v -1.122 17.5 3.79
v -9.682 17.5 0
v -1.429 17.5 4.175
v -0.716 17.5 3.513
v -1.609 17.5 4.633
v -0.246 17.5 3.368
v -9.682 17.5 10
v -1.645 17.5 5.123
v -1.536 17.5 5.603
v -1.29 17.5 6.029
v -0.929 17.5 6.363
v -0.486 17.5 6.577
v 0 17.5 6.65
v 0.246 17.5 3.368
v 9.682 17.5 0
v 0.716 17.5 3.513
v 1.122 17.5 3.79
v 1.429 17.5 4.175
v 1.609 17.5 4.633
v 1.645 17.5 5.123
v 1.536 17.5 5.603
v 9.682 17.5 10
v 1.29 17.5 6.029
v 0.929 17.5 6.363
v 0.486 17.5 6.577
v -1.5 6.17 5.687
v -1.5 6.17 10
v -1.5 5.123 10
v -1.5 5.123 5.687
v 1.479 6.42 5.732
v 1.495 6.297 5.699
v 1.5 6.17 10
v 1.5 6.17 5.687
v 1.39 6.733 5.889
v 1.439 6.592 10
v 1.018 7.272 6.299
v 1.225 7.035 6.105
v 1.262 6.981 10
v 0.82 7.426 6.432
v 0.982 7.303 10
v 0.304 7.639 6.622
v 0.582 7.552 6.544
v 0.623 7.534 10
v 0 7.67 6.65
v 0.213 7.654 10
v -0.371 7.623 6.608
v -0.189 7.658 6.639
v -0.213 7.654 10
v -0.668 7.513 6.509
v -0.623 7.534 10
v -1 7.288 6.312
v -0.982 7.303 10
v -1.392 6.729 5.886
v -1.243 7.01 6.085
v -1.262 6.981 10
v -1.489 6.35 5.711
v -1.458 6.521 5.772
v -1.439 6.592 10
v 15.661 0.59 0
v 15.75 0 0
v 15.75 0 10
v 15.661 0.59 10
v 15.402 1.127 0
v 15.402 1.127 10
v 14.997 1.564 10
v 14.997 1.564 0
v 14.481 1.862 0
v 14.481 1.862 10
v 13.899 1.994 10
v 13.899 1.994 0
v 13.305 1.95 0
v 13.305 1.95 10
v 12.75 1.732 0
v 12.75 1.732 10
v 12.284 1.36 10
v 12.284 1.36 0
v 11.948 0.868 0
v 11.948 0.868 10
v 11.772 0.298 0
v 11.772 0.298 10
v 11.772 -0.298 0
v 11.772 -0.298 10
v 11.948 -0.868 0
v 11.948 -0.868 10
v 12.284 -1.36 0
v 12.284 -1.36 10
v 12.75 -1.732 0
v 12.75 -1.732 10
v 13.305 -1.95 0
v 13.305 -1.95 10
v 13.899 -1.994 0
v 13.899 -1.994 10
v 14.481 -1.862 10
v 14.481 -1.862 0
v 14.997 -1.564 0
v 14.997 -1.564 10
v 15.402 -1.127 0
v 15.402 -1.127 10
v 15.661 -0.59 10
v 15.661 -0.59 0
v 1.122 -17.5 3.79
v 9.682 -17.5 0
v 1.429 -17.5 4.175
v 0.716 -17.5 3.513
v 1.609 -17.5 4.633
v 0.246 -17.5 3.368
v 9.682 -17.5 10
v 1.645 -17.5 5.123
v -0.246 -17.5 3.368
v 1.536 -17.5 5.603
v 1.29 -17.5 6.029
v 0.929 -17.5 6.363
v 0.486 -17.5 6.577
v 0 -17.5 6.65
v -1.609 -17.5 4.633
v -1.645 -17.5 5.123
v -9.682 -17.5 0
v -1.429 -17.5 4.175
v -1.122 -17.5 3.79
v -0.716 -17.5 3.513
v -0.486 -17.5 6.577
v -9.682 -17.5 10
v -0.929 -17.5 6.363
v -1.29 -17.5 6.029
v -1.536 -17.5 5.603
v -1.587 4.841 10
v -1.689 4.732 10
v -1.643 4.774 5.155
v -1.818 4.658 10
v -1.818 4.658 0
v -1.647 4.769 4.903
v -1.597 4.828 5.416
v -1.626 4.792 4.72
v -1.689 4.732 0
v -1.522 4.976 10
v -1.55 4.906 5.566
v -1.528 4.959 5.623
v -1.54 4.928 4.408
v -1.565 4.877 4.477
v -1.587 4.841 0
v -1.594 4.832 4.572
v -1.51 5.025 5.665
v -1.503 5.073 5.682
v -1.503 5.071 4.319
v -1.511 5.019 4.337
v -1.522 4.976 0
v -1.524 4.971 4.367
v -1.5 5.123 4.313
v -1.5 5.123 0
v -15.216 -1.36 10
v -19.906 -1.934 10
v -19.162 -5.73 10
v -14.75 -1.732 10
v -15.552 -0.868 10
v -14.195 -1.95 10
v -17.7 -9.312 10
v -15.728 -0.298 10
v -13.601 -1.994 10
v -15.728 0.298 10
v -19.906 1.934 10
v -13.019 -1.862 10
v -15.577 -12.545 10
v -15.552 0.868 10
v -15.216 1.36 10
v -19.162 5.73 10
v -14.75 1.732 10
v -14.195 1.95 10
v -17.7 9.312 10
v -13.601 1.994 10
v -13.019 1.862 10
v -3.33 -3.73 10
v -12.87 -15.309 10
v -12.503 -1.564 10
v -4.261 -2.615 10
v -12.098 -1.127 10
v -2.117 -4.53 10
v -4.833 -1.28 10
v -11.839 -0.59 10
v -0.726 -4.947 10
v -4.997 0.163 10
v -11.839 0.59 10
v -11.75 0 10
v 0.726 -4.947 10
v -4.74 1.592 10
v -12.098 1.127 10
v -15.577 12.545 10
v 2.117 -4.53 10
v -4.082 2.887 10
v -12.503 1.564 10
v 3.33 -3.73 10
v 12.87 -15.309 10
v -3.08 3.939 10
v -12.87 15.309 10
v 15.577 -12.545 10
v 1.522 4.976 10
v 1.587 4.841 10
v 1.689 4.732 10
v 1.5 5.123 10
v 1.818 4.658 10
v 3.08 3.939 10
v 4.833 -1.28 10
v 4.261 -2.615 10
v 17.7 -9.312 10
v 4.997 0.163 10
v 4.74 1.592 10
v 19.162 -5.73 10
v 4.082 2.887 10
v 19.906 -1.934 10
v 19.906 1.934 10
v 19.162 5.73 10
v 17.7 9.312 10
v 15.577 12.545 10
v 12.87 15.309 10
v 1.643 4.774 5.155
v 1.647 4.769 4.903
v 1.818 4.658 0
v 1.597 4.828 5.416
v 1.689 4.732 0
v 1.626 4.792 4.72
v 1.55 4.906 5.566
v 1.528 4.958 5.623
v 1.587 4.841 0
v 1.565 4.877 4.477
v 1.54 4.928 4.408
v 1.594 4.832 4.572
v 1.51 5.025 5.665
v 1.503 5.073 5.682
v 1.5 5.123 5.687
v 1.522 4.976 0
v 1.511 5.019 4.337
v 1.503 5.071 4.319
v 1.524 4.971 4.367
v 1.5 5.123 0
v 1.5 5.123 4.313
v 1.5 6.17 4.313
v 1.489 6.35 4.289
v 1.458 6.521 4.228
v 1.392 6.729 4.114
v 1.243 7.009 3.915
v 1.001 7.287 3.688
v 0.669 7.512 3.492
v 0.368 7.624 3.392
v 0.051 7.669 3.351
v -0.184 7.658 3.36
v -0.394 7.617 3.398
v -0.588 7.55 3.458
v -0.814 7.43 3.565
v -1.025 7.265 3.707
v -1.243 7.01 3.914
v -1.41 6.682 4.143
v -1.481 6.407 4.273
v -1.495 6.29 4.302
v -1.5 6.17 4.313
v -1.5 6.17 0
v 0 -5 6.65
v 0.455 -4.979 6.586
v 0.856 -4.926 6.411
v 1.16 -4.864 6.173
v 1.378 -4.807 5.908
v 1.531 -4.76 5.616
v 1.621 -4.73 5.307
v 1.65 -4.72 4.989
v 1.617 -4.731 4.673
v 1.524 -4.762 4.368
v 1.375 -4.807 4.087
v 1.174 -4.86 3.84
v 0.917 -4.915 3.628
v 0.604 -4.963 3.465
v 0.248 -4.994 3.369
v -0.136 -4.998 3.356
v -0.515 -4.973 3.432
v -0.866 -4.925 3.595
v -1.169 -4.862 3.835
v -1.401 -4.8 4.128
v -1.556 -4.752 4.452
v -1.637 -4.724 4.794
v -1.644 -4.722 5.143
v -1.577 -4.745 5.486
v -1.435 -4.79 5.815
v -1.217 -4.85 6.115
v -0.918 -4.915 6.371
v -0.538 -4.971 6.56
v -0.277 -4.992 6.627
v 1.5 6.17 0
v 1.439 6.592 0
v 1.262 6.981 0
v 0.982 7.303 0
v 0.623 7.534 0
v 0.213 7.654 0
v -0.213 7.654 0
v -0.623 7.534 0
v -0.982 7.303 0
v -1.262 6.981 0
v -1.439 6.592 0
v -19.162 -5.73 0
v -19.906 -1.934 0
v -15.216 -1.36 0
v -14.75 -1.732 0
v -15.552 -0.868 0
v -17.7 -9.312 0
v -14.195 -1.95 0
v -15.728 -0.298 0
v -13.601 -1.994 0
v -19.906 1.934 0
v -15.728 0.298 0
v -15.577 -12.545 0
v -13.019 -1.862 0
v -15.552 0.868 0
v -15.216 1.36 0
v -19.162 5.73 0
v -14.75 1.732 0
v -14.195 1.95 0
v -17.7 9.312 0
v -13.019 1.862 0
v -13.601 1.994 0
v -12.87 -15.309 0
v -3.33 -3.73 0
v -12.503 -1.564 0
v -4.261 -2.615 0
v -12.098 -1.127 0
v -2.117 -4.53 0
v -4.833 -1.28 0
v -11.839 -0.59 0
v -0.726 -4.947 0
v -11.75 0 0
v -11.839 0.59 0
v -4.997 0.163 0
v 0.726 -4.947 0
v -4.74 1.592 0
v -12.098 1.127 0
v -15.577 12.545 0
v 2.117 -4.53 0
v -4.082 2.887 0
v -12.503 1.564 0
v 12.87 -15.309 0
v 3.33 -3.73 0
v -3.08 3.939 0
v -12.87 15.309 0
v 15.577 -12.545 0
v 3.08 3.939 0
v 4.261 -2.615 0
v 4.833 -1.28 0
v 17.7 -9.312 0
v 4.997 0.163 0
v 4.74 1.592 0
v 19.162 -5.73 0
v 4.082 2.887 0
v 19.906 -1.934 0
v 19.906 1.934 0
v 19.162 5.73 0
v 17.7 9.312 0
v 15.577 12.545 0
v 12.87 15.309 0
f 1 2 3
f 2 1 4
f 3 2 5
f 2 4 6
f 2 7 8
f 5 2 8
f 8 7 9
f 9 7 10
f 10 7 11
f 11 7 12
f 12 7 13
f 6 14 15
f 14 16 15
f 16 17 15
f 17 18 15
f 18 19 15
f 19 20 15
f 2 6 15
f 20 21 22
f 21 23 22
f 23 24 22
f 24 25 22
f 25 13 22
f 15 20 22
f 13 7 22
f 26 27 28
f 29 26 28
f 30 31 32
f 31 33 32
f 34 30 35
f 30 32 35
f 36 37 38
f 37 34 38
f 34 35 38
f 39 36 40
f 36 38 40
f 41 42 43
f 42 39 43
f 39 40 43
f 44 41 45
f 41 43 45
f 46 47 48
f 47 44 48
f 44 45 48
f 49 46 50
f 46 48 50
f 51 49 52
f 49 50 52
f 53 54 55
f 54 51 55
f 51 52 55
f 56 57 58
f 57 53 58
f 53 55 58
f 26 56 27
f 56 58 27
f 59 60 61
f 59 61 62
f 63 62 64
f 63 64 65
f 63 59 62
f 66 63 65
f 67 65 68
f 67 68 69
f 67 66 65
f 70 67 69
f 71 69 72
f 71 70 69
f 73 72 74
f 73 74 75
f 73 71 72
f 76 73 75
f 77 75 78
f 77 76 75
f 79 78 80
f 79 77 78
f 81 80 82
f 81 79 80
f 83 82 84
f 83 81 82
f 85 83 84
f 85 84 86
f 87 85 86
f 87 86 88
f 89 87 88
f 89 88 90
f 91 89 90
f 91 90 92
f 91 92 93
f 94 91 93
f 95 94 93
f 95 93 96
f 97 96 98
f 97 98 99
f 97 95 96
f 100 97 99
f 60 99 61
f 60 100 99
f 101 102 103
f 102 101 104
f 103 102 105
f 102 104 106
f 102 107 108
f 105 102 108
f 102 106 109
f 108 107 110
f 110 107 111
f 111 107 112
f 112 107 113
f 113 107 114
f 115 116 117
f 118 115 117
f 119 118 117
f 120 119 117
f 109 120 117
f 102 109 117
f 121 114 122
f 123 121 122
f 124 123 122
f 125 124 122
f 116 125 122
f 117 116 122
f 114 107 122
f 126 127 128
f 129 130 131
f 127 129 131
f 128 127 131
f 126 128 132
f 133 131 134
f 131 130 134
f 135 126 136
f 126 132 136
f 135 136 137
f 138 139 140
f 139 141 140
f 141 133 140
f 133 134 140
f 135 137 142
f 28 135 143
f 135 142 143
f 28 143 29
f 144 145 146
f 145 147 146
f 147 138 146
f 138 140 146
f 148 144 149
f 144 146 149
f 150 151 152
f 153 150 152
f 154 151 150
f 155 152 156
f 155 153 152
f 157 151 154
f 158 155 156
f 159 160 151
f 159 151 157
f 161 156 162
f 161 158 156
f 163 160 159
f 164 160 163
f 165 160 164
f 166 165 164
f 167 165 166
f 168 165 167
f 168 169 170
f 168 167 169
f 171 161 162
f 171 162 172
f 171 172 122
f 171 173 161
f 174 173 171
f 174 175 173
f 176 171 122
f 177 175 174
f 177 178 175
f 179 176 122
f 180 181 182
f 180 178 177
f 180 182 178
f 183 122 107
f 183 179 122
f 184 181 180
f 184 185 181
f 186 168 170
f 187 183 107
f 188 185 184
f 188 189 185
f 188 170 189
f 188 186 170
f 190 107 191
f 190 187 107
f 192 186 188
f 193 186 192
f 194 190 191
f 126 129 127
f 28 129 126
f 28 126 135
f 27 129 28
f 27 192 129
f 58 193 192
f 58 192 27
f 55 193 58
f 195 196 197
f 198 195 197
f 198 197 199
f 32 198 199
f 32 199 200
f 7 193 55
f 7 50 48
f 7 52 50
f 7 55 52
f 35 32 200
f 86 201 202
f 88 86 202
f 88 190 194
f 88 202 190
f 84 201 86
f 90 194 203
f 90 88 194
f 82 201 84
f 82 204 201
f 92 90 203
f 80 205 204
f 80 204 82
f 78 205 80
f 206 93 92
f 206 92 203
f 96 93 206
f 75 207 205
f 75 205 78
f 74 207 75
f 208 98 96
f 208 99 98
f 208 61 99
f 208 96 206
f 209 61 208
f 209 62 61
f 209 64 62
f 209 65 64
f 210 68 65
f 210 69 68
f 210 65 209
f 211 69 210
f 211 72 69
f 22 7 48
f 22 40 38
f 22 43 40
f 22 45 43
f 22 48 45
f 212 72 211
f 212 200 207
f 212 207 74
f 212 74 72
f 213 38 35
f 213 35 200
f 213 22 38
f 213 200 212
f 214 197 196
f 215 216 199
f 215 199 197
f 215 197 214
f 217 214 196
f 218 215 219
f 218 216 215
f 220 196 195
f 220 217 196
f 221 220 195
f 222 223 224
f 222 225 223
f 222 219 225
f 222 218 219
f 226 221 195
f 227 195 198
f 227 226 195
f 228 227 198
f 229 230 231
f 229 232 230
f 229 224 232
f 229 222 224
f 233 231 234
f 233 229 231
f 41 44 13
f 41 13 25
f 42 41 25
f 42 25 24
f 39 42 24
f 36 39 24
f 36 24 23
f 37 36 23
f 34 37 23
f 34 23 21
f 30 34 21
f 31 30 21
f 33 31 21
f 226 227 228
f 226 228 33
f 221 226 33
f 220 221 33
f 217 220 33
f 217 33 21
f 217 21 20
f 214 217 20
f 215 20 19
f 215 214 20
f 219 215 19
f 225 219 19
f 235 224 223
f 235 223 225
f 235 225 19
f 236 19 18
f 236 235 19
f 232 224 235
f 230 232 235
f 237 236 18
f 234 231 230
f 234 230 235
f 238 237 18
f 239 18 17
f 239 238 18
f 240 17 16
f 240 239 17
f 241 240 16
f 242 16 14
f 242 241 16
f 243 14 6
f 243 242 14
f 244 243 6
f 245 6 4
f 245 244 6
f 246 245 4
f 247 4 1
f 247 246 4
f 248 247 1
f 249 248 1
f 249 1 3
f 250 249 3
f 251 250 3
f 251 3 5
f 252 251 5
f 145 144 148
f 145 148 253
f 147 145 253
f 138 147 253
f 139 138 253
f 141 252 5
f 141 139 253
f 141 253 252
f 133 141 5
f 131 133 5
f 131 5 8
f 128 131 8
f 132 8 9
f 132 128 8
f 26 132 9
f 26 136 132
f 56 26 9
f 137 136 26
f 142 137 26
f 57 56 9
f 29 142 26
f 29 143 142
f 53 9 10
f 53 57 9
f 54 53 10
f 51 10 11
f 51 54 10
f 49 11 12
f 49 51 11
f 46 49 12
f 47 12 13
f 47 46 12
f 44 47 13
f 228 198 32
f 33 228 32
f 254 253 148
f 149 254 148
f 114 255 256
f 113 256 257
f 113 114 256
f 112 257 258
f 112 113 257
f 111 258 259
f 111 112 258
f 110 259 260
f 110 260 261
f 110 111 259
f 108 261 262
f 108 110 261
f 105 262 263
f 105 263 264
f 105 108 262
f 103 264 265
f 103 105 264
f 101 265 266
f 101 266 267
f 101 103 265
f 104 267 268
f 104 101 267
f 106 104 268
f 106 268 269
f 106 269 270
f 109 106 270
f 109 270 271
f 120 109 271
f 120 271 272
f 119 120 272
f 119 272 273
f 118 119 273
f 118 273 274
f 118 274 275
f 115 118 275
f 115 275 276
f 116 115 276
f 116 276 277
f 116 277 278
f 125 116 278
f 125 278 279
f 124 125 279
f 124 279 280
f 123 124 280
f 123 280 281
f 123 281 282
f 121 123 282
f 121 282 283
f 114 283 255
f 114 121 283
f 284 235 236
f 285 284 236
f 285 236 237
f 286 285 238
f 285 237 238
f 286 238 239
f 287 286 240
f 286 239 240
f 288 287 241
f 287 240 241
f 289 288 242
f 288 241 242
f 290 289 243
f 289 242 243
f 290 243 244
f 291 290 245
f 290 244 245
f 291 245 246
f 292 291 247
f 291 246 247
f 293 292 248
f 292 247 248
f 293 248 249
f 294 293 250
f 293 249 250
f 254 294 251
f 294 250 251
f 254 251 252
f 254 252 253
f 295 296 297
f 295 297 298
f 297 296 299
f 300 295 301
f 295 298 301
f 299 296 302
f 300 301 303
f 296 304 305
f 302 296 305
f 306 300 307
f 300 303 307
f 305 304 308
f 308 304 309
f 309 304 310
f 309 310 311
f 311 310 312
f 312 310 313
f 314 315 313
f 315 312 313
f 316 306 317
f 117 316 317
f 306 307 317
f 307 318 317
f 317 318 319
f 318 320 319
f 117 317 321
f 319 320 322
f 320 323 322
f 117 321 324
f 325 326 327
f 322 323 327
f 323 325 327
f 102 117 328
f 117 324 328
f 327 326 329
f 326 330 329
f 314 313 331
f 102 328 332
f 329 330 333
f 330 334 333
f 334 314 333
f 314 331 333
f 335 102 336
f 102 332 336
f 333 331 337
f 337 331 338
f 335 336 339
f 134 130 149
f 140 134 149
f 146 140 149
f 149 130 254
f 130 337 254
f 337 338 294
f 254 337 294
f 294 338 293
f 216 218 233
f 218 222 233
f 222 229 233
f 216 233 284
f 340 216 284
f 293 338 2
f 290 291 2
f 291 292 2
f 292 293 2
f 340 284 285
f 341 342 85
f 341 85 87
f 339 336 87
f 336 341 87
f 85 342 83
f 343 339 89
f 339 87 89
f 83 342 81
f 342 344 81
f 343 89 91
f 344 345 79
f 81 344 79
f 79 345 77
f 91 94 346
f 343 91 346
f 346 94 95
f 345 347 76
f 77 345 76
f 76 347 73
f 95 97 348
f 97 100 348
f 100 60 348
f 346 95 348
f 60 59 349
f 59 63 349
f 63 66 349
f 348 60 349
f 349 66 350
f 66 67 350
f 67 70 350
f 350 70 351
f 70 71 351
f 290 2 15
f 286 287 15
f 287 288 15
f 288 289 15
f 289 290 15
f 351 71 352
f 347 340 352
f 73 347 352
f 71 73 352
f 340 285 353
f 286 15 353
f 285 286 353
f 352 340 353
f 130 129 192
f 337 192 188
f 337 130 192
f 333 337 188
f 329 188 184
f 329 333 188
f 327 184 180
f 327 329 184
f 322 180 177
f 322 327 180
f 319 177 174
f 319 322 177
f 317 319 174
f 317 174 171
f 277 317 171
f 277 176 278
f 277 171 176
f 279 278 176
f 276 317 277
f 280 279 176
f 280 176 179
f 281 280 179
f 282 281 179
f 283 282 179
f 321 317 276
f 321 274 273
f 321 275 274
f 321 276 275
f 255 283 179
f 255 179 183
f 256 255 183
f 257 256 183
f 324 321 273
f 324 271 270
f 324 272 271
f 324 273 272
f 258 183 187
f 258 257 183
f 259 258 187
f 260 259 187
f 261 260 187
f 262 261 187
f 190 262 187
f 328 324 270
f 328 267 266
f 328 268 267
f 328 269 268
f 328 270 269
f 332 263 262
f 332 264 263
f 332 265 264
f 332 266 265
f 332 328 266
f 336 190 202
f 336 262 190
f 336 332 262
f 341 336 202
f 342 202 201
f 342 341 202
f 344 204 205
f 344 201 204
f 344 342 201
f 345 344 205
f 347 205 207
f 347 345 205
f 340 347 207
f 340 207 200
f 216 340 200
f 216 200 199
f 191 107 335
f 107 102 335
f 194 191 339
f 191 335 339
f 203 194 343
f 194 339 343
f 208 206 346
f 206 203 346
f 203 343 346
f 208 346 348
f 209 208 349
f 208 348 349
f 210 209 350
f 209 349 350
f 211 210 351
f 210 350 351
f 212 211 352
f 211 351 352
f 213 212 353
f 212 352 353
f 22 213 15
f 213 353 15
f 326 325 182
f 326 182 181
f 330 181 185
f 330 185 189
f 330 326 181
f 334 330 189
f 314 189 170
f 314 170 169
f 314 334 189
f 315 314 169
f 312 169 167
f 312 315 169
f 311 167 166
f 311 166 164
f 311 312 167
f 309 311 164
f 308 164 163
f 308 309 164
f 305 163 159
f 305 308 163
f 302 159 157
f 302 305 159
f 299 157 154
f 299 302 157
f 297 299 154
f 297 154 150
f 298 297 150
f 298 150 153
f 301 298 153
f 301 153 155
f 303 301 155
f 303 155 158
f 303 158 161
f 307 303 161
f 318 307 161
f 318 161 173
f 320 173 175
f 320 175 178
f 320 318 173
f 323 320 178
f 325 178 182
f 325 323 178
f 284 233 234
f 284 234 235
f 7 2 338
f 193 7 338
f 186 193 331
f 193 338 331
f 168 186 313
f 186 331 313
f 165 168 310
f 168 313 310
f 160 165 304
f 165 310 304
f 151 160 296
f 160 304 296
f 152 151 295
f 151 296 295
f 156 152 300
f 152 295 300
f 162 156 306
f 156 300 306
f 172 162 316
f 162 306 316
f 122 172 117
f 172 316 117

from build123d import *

# Parameters (mm, degrees)
SKETCH_1_R               = 20
SKETCH_1_R_2             = 5
SKETCH_1_R_3             = 1.9999999999999996
SKETCH_1_R_4             = 2.0000000000000013
EXTRUDE_1_DEPTH          = 10
CUT_EXTRUDE_1_DEPTH      = 31
CUT_EXTRUDE_1_DEPTH_BACK = 31
SKETCH_2_R               = 1.6500000000000001
CUT_EXTRUDE_2_DEPTH      = 31.00000018509541
CUT_EXTRUDE_3_DEPTH      = 31.00000018509541
FILLET_1_R               = 0.5


with BuildPart() as part:
    # ｽｹｯﾁ1 → ﾎﾞｽ - 押し出し1 (new body)
    with BuildSketch(Plane.XY):
        Circle(SKETCH_1_R)
        Circle(SKETCH_1_R_2, mode=Mode.SUBTRACT)
        with Locations((-13.75, 0)):
            Circle(SKETCH_1_R_3, mode=Mode.SUBTRACT)
        with Locations((13.75, 0)):
            Circle(SKETCH_1_R_4, mode=Mode.SUBTRACT)
    extrude(amount=EXTRUDE_1_DEPTH)

    # ｽｹｯﾁ2 → ｶｯﾄ - 押し出し1 (cut, two sides: drawn at the far end of the back side and taken through both)
    with BuildSketch(Plane(origin=(0, 0, 0), x_dir=(1, 0, 0), z_dir=(0, 1, 0)).offset(-CUT_EXTRUDE_1_DEPTH_BACK)):
        with Locations(Location((0, -5, 0), (0, 0, 270))):
            Circle(SKETCH_2_R)
    extrude(amount=CUT_EXTRUDE_1_DEPTH + CUT_EXTRUDE_1_DEPTH_BACK, mode=Mode.SUBTRACT)

    # ｽｹｯﾁ3 → ｶｯﾄ - 押し出し2 (cut, through all)
    with BuildSketch(Plane.XY.offset(10)):
        with BuildLine():
            ThreePointArc((-0.8423325125714249, 4.928536896307575), (-0.42267926283542223, 4.982102190919903), (-8.296e-14, 5))
            Line((0, 5), (0, 6.169696007084729))
            Line((0, 6.169696007084729), (-1.5, 6.169696007084729))
            ThreePointArc((-1.5000000000000002, 6.169696007084729), (-1.3254242280977697, 5.4673779768652055), (-0.8423325125714237, 4.928536896307585))
        make_face()
        with BuildLine():
            Line((0, 6.169696007084729), (0, 5))
            ThreePointArc((-8.296e-14, 5), (0.42267926283533985, 4.982102190919911), (0.8423325125714245, 4.928536896307575))
            ThreePointArc((0.8423325125714223, 4.928536896307583), (1.325424228097769, 5.467377976865205), (1.5000000000000002, 6.169696007084729))
            Line((1.5, 6.169696007084729), (0, 6.169696007084729))
        make_face()
        with BuildLine():
            Line((-1.5, 6.169696007084729), (0, 6.169696007084729))
            Line((0, 6.169696007084729), (0, 7.669696007084729))
            ThreePointArc((1.974e-14, 7.669696007084729), (-1.0606601717798143, 7.230356178864558), (-1.5000000000000002, 6.169696007084729))
        make_face()
        with BuildLine():
            Line((0, 7.669696007084729), (0, 6.169696007084729))
            Line((0, 6.169696007084729), (1.5, 6.169696007084729))
            ThreePointArc((1.5000000000000002, 6.169696007084729), (1.0606601717798283, 7.230356178864544), (1.941e-14, 7.669696007084729))
        make_face()
        with BuildLine():
            Line((-1.5, 6.169696007084729), (0, 6.169696007084729))
            Line((0, 6.169696007084729), (0, 7.669696007084729))
            ThreePointArc((1.974e-14, 7.669696007084729), (-1.0606601717798143, 7.230356178864558), (-1.5000000000000002, 6.169696007084729))
        make_face()
        with BuildLine():
            Line((0, 7.669696007084729), (0, 6.169696007084729))
            Line((0, 6.169696007084729), (1.5, 6.169696007084729))
            ThreePointArc((1.5000000000000002, 6.169696007084729), (1.0606601717798283, 7.230356178864544), (1.941e-14, 7.669696007084729))
        make_face()
        with BuildLine():
            ThreePointArc((0.8423325125714245, 4.928536896307575), (1.173856041806049, 4.860253284872655), (1.4999999999999996, 4.769696007084728))
            Line((1.5, 4.769696007084729), (1.5, 6.169696007084729))
            ThreePointArc((1.5000000000000002, 6.169696007084729), (1.325424228097769, 5.467377976865205), (0.8423325125714223, 4.928536896307583))
        make_face()
        with BuildLine():
            ThreePointArc((-0.8423325125714249, 4.928536896307575), (-0.42267926283542223, 4.982102190919903), (-8.296e-14, 5))
            Line((0, 5), (0, 6.169696007084729))
            Line((0, 6.169696007084729), (-1.5, 6.169696007084729))
            ThreePointArc((-1.5000000000000002, 6.169696007084729), (-1.3254242280977697, 5.4673779768652055), (-0.8423325125714237, 4.928536896307585))
        make_face()
        with BuildLine():
            Line((0, 6.169696007084729), (0, 5))
            ThreePointArc((-8.296e-14, 5), (0.42267926283533985, 4.982102190919911), (0.8423325125714245, 4.928536896307575))
            ThreePointArc((0.8423325125714223, 4.928536896307583), (1.325424228097769, 5.467377976865205), (1.5000000000000002, 6.169696007084729))
            Line((1.5, 6.169696007084729), (0, 6.169696007084729))
        make_face()
        with BuildLine():
            Line((-1.5, 6.169696007084729), (-1.5, 4.769696007084729))
            ThreePointArc((-1.5, 4.769696007084728), (-1.1738560418060509, 4.8602532848726545), (-0.8423325125714249, 4.928536896307575))
            ThreePointArc((-0.8423325125714237, 4.928536896307585), (-1.3254242280977697, 5.4673779768652055), (-1.5000000000000002, 6.169696007084729))
        make_face()
    extrude(amount=-CUT_EXTRUDE_2_DEPTH, mode=Mode.SUBTRACT)

    # ｽｹｯﾁ4 → ｶｯﾄ - 押し出し3 (cut, through all)
    with BuildSketch(Plane.XY.offset(10)):
        with BuildLine():
            ThreePointArc((9.68245836551855, 17.499999999999996), (1.22e-15, 20), (-9.682458365518547, 17.499999999999996))
            Line((-9.682458365518546, 17.499999999999996), (9.68245836551855, 17.499999999999996))
        make_face()
        with BuildLine():
            Line((9.68245836551855, -17.499999999999996), (-9.682458365518546, -17.499999999999996))
            ThreePointArc((-9.682458365518551, -17.499999999999996), (-3.67e-15, -20), (9.682458365518546, -17.499999999999996))
        make_face()
    extrude(amount=-CUT_EXTRUDE_3_DEPTH, mode=Mode.SUBTRACT)

    # ﾌｨﾚｯﾄ1
    fillet_1_edges = [part.edges().sort_by_distance(p)[0] for p in [
        (1.4999999999999998, 4.769696007084728, 7.843693197647017),
        (-1.5, 4.769696007084729, 7.843693197355676),
    ]]
    fillet(fillet_1_edges, radius=FILLET_1_R)


solid = part.part
